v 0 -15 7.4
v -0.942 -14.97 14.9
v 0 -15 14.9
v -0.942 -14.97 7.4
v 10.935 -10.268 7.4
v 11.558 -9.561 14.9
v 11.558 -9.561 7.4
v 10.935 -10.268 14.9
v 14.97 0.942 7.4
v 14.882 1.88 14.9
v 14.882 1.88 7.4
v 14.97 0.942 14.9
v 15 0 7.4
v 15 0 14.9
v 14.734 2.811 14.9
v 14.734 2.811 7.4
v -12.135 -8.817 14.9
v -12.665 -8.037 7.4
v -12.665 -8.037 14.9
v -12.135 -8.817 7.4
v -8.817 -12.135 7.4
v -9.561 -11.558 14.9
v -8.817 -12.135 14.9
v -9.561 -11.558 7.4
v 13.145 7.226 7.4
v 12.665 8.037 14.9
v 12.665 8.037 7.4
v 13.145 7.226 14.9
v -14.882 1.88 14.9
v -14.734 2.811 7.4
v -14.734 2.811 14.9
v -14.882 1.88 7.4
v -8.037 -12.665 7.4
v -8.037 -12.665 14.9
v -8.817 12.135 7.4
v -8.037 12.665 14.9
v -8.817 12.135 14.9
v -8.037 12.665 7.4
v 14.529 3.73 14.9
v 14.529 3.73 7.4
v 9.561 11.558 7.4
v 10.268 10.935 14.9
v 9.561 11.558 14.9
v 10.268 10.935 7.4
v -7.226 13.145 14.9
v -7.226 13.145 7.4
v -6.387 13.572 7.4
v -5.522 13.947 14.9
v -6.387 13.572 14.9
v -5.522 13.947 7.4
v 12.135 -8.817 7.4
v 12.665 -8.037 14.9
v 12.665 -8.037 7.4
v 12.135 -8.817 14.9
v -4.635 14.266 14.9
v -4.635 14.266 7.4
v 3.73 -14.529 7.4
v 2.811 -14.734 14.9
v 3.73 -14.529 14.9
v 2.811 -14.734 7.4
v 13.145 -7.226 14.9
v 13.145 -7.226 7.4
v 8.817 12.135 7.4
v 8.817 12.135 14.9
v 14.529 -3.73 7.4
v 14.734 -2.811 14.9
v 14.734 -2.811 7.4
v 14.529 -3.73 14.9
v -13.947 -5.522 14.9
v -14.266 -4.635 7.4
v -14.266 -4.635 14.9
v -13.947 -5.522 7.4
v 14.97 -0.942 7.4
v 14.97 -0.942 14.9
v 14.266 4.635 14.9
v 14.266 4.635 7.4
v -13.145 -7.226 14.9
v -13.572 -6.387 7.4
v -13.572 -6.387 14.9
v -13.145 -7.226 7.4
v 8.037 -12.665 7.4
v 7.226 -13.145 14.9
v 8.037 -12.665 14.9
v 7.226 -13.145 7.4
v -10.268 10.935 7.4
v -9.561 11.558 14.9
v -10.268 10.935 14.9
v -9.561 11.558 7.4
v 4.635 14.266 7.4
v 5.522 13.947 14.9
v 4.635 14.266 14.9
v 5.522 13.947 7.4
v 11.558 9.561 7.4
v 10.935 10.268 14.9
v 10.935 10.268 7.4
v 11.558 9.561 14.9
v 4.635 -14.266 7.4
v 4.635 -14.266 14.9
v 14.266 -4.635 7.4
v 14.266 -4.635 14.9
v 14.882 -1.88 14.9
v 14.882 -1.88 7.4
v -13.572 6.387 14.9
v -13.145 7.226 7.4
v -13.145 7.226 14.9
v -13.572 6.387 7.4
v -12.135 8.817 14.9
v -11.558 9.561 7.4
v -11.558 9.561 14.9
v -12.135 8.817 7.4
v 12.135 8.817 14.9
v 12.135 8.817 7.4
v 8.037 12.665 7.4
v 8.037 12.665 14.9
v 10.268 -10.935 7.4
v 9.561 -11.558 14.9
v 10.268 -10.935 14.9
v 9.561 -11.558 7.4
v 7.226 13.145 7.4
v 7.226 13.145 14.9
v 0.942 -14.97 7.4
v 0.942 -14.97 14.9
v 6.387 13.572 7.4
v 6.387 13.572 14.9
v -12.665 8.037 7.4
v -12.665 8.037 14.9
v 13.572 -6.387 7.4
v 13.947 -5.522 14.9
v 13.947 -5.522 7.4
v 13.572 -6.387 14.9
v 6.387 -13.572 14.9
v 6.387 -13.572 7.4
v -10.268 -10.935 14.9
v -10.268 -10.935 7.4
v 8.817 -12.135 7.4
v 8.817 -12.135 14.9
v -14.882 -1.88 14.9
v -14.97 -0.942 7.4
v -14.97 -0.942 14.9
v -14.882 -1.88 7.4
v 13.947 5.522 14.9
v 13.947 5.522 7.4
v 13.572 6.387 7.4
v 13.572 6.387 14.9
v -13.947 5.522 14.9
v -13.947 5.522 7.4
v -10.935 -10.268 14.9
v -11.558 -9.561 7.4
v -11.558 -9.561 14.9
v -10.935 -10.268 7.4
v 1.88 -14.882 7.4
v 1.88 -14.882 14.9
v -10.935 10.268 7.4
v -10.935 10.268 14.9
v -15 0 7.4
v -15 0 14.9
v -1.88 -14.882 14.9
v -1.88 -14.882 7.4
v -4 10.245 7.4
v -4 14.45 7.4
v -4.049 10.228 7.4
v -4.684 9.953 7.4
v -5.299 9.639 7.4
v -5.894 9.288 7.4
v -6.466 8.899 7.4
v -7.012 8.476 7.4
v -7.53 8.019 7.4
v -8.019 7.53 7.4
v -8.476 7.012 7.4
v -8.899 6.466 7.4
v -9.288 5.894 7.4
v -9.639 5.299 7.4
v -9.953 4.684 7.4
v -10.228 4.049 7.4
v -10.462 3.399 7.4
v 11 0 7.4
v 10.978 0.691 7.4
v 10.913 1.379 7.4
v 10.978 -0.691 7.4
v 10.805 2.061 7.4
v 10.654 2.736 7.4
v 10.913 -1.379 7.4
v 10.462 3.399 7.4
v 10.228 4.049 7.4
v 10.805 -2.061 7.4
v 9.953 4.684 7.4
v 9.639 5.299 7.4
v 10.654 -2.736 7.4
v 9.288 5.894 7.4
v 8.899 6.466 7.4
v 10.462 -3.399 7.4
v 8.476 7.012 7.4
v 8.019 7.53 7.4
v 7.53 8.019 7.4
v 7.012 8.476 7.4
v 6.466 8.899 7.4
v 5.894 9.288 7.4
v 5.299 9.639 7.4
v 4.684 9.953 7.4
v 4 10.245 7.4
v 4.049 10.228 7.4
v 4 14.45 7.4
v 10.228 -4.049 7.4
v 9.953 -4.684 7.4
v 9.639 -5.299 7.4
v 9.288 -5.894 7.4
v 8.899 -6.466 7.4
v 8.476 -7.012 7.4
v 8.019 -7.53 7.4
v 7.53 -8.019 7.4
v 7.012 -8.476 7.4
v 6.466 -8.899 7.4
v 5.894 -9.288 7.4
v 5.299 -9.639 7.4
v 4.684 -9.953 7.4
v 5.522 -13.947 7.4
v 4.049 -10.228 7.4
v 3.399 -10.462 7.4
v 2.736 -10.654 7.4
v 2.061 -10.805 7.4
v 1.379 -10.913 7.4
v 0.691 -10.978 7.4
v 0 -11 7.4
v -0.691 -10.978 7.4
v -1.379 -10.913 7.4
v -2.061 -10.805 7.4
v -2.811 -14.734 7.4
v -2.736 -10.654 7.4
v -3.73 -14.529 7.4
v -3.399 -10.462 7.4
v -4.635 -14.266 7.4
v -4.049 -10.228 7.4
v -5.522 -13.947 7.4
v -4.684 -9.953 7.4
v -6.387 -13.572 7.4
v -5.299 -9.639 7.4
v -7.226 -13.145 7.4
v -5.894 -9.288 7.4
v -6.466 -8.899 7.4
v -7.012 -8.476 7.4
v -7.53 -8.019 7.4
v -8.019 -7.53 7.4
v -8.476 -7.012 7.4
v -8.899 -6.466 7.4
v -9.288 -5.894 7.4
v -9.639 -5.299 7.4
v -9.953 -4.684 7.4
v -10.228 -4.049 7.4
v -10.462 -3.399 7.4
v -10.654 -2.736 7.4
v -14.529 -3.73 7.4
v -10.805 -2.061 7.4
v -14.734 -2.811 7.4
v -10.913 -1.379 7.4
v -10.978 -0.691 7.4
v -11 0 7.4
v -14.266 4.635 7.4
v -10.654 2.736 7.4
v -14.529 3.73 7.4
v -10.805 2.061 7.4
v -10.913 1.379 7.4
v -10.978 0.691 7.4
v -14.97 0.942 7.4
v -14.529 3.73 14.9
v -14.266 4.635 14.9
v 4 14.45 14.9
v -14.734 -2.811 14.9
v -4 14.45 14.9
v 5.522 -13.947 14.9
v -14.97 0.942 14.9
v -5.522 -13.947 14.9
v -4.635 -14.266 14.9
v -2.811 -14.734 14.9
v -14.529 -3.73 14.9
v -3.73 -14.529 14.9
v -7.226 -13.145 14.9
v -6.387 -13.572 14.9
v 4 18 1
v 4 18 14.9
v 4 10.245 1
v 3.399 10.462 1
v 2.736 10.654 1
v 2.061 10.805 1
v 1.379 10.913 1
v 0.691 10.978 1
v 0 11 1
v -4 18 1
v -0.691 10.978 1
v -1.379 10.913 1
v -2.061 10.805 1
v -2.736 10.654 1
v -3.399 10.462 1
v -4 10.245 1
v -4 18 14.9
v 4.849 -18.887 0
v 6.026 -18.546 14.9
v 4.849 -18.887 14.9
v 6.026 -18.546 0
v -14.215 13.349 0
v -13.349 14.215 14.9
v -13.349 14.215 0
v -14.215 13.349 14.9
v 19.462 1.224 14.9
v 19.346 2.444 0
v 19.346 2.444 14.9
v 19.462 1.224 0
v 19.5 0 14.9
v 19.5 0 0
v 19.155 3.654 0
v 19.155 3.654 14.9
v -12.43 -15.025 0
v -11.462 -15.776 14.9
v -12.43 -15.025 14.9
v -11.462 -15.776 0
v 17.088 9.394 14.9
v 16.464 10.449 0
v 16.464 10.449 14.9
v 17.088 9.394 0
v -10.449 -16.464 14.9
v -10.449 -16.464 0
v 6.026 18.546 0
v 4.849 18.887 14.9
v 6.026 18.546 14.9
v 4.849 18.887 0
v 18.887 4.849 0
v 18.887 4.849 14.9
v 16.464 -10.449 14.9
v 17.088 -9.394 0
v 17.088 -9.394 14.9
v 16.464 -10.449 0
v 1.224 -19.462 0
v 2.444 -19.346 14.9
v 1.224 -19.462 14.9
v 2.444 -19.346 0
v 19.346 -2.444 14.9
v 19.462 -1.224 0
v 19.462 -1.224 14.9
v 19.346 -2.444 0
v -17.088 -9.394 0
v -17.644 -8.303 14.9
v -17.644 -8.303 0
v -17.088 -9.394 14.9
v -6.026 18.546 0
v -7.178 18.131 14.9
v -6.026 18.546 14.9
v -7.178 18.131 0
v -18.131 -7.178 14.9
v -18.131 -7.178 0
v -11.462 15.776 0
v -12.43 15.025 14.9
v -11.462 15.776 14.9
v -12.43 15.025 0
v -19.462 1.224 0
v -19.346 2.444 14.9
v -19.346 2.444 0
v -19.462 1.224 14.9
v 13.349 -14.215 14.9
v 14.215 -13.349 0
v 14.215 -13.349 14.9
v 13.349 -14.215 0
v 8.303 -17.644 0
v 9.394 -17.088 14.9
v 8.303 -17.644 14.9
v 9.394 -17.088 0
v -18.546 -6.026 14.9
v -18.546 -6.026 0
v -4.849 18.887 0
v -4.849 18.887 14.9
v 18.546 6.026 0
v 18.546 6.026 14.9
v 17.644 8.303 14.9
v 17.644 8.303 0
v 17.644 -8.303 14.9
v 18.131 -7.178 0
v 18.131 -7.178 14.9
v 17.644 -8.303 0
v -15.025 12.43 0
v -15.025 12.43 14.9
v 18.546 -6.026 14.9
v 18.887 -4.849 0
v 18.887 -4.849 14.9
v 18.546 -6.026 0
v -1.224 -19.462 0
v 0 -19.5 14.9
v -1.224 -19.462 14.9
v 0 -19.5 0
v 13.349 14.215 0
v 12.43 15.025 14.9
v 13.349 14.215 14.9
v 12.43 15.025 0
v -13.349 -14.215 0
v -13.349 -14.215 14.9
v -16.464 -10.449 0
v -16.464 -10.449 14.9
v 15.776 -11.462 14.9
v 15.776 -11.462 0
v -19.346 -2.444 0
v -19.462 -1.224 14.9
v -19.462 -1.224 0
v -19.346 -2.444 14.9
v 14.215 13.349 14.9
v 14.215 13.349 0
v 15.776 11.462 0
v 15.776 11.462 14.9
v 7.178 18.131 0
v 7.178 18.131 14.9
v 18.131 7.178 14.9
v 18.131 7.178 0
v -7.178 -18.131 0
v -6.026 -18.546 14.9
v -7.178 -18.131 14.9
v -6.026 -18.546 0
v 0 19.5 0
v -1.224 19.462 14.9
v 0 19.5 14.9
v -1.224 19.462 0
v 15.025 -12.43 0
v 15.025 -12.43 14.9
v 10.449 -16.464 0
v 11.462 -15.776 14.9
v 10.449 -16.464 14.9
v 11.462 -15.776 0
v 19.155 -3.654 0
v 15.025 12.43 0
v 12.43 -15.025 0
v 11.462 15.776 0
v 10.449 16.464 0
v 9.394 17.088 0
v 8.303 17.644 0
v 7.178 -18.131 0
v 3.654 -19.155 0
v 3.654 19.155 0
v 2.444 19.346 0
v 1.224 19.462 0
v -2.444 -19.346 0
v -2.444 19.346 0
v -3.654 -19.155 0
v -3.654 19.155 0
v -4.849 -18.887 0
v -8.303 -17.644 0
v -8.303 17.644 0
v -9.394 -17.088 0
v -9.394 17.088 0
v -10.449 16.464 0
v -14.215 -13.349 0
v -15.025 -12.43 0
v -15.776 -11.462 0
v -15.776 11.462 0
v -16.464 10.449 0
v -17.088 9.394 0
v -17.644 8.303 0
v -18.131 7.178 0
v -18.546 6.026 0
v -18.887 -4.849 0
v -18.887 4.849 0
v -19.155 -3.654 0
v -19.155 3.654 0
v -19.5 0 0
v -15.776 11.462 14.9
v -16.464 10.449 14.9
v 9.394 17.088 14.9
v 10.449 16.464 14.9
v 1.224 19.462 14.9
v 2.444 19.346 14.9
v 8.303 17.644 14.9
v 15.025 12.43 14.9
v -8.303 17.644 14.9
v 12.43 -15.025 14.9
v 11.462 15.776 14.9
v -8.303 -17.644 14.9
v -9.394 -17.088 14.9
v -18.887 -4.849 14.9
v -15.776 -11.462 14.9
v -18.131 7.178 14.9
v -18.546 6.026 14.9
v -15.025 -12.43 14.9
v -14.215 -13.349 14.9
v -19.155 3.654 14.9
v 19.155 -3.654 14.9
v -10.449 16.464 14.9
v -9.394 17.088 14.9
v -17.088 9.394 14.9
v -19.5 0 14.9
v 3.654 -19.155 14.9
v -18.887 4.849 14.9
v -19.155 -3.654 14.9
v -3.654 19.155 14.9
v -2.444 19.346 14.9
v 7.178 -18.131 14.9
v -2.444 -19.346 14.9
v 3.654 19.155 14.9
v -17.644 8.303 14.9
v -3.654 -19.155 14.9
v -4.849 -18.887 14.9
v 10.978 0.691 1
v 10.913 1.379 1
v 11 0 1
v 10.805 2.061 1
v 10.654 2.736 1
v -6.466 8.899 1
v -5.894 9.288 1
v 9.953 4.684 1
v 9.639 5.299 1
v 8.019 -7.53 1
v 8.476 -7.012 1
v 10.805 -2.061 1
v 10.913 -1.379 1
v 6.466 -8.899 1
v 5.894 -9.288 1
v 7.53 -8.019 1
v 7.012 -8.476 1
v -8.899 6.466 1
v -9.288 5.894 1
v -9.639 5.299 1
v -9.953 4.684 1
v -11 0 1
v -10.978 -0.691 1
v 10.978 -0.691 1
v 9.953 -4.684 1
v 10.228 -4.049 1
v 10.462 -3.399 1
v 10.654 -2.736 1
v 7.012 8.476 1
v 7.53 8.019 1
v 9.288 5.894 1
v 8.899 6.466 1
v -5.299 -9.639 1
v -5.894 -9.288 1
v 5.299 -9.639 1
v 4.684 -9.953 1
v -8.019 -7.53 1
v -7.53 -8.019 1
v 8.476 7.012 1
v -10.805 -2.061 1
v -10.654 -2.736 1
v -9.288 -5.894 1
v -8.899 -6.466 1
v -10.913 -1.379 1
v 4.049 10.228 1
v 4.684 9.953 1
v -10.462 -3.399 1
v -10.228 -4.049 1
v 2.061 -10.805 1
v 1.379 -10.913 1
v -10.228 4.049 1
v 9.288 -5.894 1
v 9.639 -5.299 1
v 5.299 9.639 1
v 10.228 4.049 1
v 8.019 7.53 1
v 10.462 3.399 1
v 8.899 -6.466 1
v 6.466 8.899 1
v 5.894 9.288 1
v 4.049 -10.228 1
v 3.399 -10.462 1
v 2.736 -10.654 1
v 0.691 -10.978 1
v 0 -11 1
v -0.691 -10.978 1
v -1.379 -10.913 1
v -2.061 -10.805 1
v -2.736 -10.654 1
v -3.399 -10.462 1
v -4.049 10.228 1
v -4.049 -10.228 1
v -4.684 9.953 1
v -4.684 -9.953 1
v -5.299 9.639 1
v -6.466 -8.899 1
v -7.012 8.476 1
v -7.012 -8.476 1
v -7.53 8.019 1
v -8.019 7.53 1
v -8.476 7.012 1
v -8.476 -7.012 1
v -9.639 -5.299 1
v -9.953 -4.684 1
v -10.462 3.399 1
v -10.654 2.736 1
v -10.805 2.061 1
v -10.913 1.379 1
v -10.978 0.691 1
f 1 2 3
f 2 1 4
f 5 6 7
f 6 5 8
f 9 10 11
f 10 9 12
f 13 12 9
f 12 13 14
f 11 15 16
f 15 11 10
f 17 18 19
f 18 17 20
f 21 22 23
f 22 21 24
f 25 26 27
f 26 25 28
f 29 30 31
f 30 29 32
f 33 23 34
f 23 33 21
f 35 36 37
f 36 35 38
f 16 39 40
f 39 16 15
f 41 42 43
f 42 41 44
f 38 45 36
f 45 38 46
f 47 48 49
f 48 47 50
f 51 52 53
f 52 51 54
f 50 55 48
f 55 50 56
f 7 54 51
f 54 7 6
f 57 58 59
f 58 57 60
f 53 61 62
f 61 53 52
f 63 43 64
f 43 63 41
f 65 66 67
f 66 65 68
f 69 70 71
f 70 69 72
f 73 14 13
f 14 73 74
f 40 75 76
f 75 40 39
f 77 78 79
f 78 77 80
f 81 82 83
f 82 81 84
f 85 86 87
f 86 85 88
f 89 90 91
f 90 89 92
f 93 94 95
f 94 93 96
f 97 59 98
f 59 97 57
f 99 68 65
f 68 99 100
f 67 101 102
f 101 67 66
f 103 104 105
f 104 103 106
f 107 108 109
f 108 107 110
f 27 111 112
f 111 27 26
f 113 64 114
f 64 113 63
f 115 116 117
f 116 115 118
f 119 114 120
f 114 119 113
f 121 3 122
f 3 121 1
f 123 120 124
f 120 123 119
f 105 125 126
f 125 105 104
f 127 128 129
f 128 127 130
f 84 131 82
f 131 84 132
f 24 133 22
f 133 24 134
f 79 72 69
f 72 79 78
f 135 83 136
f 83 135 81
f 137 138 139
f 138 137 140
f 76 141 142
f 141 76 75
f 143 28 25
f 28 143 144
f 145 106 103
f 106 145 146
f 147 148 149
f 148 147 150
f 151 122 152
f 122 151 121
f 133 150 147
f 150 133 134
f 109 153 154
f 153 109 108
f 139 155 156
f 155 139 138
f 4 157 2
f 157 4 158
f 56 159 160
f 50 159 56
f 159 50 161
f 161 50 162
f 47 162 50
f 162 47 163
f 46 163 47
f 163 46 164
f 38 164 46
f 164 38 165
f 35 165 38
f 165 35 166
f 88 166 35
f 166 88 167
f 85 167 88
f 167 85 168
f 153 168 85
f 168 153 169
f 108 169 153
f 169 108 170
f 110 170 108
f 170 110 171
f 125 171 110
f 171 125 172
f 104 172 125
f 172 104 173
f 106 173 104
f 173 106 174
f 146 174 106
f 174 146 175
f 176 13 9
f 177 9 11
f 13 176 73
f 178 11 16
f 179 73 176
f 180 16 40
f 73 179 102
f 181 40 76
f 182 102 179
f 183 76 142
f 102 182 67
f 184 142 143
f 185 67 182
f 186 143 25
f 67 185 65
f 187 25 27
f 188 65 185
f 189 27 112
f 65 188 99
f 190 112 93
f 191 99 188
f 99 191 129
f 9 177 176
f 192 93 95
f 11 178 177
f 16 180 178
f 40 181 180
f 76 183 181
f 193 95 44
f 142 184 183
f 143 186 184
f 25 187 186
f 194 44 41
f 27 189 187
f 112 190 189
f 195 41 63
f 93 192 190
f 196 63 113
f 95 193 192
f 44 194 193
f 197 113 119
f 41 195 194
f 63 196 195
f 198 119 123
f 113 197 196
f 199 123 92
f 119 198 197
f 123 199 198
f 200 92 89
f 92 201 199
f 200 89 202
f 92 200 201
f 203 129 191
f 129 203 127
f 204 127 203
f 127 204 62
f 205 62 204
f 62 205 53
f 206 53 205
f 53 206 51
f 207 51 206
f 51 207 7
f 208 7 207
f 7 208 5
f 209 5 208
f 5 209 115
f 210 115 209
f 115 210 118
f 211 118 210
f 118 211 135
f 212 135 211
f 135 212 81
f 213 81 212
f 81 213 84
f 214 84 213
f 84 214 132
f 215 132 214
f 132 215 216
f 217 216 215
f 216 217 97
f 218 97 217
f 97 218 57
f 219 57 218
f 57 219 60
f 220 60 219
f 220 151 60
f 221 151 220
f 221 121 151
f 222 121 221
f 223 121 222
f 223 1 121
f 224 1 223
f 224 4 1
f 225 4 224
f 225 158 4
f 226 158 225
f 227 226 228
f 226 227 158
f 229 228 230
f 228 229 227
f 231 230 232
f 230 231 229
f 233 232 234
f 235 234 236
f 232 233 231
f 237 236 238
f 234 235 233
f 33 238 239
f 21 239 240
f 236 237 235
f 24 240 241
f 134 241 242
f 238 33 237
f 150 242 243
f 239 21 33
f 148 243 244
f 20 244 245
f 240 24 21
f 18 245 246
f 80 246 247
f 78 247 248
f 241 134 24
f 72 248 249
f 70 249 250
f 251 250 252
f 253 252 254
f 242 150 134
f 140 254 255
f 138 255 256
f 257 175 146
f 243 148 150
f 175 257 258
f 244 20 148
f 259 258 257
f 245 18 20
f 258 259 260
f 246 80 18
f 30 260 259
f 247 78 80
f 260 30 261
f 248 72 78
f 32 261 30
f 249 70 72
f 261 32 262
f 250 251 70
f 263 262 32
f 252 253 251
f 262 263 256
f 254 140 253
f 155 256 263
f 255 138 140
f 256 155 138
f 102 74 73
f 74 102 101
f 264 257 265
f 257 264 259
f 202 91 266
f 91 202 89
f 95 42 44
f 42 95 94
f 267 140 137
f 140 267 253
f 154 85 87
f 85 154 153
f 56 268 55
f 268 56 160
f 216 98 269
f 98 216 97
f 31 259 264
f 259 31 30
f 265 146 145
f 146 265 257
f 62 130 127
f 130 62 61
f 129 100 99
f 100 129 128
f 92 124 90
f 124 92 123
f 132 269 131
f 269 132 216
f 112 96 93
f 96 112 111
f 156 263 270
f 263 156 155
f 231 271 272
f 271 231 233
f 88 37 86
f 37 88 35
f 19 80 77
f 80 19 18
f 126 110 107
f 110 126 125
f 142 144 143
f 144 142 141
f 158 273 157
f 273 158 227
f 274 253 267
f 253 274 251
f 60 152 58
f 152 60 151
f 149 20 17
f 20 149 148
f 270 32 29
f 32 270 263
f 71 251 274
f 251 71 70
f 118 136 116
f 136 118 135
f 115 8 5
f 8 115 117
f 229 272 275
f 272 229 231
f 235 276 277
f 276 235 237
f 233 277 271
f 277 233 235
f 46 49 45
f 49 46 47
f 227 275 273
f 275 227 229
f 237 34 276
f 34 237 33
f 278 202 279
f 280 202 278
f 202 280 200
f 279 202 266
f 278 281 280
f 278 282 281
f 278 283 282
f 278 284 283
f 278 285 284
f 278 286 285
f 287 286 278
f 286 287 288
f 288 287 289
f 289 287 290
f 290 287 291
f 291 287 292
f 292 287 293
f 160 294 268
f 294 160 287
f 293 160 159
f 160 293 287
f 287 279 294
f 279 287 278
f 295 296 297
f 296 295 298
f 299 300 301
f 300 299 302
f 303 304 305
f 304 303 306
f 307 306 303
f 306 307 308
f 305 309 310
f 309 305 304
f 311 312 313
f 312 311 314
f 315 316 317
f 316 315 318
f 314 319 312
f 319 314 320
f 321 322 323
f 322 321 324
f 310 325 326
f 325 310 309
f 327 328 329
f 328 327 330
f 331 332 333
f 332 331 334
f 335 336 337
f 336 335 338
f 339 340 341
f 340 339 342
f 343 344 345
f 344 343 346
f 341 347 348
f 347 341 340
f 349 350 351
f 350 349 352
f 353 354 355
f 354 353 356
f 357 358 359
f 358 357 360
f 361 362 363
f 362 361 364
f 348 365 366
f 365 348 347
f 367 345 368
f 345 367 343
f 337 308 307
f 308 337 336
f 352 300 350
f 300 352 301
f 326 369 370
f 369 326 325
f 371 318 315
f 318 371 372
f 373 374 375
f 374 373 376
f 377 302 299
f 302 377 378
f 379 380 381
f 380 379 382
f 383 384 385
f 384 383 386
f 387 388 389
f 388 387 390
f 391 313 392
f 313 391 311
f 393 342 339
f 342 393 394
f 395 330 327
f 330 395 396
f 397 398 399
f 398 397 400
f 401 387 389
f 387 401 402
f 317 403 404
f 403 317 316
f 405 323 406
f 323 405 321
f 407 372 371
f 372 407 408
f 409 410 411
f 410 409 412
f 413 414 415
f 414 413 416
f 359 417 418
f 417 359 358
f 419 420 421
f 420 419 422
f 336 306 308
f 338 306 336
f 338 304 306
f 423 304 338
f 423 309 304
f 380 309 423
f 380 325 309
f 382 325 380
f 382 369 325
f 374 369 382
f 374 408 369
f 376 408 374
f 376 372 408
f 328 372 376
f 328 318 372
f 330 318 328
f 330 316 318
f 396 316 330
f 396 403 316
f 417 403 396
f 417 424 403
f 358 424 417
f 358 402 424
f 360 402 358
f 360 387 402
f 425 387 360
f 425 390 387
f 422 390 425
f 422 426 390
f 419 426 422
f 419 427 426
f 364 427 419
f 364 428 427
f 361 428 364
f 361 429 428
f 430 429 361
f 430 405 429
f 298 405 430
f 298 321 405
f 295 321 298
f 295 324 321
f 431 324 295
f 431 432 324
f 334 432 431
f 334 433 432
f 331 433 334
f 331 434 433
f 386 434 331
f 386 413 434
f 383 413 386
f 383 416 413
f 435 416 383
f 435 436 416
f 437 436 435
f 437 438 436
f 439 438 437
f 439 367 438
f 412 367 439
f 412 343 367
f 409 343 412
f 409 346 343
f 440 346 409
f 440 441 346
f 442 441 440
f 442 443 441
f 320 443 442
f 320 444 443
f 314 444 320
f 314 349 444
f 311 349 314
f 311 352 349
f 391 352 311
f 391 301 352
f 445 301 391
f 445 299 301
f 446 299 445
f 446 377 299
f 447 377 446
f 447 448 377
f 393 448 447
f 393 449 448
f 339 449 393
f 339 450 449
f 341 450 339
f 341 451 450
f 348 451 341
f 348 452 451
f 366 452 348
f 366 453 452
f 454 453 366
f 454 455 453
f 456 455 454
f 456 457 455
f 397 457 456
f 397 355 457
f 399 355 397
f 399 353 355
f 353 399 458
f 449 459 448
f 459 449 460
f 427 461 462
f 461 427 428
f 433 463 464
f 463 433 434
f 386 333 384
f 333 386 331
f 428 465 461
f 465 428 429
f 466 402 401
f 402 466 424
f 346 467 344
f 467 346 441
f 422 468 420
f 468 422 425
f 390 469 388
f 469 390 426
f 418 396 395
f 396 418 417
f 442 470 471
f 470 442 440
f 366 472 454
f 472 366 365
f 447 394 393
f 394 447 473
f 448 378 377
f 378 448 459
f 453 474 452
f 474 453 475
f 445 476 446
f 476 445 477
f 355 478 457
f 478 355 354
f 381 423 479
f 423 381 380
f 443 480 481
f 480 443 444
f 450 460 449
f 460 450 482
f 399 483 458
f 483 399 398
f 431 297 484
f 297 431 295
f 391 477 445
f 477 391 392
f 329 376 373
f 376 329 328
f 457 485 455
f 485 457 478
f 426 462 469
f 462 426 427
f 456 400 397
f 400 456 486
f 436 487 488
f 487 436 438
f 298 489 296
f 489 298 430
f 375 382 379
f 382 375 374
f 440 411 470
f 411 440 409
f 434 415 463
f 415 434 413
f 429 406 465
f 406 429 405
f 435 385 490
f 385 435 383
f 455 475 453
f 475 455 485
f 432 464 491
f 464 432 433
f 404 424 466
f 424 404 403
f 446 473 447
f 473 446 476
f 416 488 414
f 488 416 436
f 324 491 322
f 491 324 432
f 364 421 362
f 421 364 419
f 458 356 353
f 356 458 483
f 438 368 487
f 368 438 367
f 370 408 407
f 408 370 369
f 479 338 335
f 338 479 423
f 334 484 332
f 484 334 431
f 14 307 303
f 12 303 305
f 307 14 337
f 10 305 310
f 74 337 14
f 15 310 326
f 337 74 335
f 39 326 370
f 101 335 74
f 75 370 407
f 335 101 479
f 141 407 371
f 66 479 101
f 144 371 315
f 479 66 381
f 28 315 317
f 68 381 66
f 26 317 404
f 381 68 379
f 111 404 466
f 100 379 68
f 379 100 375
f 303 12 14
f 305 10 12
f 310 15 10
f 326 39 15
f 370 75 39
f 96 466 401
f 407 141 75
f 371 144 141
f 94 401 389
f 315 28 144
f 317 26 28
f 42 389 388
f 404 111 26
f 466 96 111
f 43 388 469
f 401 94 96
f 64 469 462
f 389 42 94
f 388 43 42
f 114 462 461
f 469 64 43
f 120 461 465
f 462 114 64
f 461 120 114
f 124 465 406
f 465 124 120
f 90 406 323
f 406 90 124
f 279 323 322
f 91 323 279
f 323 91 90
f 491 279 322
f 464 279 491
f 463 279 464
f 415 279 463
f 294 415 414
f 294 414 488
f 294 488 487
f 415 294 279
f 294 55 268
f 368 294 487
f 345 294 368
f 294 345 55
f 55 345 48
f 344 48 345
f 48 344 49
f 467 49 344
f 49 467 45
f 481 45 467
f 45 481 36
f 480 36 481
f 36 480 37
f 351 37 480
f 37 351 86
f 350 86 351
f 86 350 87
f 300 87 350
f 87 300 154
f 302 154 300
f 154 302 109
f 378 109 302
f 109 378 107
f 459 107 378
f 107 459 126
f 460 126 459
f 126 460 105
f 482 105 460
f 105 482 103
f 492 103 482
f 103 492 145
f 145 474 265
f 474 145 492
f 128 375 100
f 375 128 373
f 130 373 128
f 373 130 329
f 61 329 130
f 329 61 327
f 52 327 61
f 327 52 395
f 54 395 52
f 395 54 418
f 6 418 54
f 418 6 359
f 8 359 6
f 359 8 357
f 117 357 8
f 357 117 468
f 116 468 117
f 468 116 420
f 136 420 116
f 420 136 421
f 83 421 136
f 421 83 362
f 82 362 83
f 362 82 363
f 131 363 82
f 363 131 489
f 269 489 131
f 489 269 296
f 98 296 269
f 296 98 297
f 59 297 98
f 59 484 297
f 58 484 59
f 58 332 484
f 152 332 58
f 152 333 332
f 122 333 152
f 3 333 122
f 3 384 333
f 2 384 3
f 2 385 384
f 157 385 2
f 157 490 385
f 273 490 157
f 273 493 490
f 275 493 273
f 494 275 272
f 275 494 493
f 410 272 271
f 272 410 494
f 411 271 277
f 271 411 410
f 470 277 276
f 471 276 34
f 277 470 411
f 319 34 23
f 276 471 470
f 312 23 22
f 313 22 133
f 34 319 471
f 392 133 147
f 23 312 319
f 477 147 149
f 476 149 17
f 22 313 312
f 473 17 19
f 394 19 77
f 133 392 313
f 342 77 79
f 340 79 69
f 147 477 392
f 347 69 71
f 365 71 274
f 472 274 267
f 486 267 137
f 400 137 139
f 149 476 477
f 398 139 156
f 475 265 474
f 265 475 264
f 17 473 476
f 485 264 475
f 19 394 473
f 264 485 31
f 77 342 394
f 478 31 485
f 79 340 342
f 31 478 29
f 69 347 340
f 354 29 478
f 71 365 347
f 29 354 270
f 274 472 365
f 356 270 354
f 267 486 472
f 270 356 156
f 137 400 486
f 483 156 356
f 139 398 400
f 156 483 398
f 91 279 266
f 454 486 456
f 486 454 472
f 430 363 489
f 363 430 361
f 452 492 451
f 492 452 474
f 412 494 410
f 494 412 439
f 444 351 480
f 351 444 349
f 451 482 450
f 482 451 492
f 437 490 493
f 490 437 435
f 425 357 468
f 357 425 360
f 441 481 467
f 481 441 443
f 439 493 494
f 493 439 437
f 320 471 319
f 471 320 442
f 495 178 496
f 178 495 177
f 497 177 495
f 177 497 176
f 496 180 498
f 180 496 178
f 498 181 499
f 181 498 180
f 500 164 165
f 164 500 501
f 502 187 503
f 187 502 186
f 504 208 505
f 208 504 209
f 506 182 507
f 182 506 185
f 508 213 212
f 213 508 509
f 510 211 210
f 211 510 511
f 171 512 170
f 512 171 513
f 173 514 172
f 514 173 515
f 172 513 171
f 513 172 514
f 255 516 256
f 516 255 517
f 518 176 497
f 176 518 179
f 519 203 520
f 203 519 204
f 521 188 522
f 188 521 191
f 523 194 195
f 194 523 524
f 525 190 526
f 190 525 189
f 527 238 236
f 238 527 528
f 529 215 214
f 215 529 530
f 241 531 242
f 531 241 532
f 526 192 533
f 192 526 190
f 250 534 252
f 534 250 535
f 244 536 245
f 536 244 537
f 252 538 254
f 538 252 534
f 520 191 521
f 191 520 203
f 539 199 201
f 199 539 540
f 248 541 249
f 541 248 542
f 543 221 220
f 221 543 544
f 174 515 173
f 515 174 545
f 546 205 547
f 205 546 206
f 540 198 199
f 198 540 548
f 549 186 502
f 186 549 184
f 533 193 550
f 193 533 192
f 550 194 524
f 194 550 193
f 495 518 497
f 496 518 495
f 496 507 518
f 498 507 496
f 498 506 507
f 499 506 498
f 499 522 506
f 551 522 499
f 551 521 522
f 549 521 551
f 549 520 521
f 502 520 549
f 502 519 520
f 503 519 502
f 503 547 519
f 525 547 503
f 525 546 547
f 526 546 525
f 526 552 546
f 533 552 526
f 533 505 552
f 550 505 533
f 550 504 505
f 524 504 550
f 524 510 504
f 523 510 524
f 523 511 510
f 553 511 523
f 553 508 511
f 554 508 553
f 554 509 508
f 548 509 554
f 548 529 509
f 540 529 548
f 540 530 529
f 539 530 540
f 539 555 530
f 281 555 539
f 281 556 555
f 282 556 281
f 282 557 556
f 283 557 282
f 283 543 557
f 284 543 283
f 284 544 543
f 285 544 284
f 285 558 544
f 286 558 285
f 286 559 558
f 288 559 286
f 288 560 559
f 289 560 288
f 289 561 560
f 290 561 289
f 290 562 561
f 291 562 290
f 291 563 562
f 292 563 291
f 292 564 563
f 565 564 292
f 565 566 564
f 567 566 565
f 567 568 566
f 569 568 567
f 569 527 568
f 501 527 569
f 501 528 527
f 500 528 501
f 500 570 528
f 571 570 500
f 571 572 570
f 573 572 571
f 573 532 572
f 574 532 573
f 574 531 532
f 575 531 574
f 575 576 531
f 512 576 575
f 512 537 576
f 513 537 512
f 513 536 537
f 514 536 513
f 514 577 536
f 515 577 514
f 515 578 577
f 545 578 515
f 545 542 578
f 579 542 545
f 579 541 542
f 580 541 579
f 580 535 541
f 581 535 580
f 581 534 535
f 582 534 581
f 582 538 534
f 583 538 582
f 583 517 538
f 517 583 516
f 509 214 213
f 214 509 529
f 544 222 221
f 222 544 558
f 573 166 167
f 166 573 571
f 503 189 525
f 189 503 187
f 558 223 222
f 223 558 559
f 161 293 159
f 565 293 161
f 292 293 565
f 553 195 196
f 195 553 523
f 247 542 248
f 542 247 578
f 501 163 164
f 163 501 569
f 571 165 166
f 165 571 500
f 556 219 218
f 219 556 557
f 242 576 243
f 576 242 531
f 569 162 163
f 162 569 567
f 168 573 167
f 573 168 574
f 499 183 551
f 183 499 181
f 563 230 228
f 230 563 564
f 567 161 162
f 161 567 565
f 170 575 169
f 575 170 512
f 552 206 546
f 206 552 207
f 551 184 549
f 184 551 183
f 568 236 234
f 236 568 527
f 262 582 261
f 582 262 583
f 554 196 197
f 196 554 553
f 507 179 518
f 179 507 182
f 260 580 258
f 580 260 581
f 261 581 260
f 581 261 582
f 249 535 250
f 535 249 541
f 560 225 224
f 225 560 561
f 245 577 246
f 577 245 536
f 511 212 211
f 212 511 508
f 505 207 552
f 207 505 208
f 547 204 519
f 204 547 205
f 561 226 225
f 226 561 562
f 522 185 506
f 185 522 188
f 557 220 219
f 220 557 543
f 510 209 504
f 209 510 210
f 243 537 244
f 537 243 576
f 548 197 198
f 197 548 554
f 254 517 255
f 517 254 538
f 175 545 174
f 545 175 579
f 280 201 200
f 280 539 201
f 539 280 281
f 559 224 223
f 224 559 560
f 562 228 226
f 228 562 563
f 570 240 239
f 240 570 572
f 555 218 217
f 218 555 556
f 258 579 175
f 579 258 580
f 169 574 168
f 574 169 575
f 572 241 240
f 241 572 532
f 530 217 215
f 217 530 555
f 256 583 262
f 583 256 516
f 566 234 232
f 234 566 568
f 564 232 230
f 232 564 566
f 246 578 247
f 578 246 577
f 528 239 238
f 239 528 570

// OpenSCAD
/*
    Parts
    1x Gemma M0
    2x CR2032 Lithium coin cell (20mm x 3.2mm)
*/

TOLERANCE = 1;
SOCKET_DIAMETER = 39;
BOARD_DIAMETER = 28;
BOARD_HEIGHT = 6.5;
CELL_DIAMETER = 20;
CELL_HEIGHT = 3.2;

$fn=100;

difference(){
    // outer shell
    cylinder(r=SOCKET_DIAMETER/2, h=BOARD_HEIGHT + (CELL_HEIGHT*2) + TOLERANCE + 1);
    
    // battery cut-out
    translate([0,0,1]){
        cylinder(r=(CELL_DIAMETER/2)+TOLERANCE, h=(CELL_HEIGHT*2)+1);
    }
    
    // board cut-out
    translate([0,0,(CELL_HEIGHT*2)+1]){
        cylinder(r=(BOARD_DIAMETER/2)+TOLERANCE, h=BOARD_HEIGHT + TOLERANCE + 1);
        translate([-4,(CELL_DIAMETER/2),-(CELL_HEIGHT*2)]){
            cube([8,8,BOARD_HEIGHT + (CELL_HEIGHT*2) + TOLERANCE + 1]);
        }
    }
}
